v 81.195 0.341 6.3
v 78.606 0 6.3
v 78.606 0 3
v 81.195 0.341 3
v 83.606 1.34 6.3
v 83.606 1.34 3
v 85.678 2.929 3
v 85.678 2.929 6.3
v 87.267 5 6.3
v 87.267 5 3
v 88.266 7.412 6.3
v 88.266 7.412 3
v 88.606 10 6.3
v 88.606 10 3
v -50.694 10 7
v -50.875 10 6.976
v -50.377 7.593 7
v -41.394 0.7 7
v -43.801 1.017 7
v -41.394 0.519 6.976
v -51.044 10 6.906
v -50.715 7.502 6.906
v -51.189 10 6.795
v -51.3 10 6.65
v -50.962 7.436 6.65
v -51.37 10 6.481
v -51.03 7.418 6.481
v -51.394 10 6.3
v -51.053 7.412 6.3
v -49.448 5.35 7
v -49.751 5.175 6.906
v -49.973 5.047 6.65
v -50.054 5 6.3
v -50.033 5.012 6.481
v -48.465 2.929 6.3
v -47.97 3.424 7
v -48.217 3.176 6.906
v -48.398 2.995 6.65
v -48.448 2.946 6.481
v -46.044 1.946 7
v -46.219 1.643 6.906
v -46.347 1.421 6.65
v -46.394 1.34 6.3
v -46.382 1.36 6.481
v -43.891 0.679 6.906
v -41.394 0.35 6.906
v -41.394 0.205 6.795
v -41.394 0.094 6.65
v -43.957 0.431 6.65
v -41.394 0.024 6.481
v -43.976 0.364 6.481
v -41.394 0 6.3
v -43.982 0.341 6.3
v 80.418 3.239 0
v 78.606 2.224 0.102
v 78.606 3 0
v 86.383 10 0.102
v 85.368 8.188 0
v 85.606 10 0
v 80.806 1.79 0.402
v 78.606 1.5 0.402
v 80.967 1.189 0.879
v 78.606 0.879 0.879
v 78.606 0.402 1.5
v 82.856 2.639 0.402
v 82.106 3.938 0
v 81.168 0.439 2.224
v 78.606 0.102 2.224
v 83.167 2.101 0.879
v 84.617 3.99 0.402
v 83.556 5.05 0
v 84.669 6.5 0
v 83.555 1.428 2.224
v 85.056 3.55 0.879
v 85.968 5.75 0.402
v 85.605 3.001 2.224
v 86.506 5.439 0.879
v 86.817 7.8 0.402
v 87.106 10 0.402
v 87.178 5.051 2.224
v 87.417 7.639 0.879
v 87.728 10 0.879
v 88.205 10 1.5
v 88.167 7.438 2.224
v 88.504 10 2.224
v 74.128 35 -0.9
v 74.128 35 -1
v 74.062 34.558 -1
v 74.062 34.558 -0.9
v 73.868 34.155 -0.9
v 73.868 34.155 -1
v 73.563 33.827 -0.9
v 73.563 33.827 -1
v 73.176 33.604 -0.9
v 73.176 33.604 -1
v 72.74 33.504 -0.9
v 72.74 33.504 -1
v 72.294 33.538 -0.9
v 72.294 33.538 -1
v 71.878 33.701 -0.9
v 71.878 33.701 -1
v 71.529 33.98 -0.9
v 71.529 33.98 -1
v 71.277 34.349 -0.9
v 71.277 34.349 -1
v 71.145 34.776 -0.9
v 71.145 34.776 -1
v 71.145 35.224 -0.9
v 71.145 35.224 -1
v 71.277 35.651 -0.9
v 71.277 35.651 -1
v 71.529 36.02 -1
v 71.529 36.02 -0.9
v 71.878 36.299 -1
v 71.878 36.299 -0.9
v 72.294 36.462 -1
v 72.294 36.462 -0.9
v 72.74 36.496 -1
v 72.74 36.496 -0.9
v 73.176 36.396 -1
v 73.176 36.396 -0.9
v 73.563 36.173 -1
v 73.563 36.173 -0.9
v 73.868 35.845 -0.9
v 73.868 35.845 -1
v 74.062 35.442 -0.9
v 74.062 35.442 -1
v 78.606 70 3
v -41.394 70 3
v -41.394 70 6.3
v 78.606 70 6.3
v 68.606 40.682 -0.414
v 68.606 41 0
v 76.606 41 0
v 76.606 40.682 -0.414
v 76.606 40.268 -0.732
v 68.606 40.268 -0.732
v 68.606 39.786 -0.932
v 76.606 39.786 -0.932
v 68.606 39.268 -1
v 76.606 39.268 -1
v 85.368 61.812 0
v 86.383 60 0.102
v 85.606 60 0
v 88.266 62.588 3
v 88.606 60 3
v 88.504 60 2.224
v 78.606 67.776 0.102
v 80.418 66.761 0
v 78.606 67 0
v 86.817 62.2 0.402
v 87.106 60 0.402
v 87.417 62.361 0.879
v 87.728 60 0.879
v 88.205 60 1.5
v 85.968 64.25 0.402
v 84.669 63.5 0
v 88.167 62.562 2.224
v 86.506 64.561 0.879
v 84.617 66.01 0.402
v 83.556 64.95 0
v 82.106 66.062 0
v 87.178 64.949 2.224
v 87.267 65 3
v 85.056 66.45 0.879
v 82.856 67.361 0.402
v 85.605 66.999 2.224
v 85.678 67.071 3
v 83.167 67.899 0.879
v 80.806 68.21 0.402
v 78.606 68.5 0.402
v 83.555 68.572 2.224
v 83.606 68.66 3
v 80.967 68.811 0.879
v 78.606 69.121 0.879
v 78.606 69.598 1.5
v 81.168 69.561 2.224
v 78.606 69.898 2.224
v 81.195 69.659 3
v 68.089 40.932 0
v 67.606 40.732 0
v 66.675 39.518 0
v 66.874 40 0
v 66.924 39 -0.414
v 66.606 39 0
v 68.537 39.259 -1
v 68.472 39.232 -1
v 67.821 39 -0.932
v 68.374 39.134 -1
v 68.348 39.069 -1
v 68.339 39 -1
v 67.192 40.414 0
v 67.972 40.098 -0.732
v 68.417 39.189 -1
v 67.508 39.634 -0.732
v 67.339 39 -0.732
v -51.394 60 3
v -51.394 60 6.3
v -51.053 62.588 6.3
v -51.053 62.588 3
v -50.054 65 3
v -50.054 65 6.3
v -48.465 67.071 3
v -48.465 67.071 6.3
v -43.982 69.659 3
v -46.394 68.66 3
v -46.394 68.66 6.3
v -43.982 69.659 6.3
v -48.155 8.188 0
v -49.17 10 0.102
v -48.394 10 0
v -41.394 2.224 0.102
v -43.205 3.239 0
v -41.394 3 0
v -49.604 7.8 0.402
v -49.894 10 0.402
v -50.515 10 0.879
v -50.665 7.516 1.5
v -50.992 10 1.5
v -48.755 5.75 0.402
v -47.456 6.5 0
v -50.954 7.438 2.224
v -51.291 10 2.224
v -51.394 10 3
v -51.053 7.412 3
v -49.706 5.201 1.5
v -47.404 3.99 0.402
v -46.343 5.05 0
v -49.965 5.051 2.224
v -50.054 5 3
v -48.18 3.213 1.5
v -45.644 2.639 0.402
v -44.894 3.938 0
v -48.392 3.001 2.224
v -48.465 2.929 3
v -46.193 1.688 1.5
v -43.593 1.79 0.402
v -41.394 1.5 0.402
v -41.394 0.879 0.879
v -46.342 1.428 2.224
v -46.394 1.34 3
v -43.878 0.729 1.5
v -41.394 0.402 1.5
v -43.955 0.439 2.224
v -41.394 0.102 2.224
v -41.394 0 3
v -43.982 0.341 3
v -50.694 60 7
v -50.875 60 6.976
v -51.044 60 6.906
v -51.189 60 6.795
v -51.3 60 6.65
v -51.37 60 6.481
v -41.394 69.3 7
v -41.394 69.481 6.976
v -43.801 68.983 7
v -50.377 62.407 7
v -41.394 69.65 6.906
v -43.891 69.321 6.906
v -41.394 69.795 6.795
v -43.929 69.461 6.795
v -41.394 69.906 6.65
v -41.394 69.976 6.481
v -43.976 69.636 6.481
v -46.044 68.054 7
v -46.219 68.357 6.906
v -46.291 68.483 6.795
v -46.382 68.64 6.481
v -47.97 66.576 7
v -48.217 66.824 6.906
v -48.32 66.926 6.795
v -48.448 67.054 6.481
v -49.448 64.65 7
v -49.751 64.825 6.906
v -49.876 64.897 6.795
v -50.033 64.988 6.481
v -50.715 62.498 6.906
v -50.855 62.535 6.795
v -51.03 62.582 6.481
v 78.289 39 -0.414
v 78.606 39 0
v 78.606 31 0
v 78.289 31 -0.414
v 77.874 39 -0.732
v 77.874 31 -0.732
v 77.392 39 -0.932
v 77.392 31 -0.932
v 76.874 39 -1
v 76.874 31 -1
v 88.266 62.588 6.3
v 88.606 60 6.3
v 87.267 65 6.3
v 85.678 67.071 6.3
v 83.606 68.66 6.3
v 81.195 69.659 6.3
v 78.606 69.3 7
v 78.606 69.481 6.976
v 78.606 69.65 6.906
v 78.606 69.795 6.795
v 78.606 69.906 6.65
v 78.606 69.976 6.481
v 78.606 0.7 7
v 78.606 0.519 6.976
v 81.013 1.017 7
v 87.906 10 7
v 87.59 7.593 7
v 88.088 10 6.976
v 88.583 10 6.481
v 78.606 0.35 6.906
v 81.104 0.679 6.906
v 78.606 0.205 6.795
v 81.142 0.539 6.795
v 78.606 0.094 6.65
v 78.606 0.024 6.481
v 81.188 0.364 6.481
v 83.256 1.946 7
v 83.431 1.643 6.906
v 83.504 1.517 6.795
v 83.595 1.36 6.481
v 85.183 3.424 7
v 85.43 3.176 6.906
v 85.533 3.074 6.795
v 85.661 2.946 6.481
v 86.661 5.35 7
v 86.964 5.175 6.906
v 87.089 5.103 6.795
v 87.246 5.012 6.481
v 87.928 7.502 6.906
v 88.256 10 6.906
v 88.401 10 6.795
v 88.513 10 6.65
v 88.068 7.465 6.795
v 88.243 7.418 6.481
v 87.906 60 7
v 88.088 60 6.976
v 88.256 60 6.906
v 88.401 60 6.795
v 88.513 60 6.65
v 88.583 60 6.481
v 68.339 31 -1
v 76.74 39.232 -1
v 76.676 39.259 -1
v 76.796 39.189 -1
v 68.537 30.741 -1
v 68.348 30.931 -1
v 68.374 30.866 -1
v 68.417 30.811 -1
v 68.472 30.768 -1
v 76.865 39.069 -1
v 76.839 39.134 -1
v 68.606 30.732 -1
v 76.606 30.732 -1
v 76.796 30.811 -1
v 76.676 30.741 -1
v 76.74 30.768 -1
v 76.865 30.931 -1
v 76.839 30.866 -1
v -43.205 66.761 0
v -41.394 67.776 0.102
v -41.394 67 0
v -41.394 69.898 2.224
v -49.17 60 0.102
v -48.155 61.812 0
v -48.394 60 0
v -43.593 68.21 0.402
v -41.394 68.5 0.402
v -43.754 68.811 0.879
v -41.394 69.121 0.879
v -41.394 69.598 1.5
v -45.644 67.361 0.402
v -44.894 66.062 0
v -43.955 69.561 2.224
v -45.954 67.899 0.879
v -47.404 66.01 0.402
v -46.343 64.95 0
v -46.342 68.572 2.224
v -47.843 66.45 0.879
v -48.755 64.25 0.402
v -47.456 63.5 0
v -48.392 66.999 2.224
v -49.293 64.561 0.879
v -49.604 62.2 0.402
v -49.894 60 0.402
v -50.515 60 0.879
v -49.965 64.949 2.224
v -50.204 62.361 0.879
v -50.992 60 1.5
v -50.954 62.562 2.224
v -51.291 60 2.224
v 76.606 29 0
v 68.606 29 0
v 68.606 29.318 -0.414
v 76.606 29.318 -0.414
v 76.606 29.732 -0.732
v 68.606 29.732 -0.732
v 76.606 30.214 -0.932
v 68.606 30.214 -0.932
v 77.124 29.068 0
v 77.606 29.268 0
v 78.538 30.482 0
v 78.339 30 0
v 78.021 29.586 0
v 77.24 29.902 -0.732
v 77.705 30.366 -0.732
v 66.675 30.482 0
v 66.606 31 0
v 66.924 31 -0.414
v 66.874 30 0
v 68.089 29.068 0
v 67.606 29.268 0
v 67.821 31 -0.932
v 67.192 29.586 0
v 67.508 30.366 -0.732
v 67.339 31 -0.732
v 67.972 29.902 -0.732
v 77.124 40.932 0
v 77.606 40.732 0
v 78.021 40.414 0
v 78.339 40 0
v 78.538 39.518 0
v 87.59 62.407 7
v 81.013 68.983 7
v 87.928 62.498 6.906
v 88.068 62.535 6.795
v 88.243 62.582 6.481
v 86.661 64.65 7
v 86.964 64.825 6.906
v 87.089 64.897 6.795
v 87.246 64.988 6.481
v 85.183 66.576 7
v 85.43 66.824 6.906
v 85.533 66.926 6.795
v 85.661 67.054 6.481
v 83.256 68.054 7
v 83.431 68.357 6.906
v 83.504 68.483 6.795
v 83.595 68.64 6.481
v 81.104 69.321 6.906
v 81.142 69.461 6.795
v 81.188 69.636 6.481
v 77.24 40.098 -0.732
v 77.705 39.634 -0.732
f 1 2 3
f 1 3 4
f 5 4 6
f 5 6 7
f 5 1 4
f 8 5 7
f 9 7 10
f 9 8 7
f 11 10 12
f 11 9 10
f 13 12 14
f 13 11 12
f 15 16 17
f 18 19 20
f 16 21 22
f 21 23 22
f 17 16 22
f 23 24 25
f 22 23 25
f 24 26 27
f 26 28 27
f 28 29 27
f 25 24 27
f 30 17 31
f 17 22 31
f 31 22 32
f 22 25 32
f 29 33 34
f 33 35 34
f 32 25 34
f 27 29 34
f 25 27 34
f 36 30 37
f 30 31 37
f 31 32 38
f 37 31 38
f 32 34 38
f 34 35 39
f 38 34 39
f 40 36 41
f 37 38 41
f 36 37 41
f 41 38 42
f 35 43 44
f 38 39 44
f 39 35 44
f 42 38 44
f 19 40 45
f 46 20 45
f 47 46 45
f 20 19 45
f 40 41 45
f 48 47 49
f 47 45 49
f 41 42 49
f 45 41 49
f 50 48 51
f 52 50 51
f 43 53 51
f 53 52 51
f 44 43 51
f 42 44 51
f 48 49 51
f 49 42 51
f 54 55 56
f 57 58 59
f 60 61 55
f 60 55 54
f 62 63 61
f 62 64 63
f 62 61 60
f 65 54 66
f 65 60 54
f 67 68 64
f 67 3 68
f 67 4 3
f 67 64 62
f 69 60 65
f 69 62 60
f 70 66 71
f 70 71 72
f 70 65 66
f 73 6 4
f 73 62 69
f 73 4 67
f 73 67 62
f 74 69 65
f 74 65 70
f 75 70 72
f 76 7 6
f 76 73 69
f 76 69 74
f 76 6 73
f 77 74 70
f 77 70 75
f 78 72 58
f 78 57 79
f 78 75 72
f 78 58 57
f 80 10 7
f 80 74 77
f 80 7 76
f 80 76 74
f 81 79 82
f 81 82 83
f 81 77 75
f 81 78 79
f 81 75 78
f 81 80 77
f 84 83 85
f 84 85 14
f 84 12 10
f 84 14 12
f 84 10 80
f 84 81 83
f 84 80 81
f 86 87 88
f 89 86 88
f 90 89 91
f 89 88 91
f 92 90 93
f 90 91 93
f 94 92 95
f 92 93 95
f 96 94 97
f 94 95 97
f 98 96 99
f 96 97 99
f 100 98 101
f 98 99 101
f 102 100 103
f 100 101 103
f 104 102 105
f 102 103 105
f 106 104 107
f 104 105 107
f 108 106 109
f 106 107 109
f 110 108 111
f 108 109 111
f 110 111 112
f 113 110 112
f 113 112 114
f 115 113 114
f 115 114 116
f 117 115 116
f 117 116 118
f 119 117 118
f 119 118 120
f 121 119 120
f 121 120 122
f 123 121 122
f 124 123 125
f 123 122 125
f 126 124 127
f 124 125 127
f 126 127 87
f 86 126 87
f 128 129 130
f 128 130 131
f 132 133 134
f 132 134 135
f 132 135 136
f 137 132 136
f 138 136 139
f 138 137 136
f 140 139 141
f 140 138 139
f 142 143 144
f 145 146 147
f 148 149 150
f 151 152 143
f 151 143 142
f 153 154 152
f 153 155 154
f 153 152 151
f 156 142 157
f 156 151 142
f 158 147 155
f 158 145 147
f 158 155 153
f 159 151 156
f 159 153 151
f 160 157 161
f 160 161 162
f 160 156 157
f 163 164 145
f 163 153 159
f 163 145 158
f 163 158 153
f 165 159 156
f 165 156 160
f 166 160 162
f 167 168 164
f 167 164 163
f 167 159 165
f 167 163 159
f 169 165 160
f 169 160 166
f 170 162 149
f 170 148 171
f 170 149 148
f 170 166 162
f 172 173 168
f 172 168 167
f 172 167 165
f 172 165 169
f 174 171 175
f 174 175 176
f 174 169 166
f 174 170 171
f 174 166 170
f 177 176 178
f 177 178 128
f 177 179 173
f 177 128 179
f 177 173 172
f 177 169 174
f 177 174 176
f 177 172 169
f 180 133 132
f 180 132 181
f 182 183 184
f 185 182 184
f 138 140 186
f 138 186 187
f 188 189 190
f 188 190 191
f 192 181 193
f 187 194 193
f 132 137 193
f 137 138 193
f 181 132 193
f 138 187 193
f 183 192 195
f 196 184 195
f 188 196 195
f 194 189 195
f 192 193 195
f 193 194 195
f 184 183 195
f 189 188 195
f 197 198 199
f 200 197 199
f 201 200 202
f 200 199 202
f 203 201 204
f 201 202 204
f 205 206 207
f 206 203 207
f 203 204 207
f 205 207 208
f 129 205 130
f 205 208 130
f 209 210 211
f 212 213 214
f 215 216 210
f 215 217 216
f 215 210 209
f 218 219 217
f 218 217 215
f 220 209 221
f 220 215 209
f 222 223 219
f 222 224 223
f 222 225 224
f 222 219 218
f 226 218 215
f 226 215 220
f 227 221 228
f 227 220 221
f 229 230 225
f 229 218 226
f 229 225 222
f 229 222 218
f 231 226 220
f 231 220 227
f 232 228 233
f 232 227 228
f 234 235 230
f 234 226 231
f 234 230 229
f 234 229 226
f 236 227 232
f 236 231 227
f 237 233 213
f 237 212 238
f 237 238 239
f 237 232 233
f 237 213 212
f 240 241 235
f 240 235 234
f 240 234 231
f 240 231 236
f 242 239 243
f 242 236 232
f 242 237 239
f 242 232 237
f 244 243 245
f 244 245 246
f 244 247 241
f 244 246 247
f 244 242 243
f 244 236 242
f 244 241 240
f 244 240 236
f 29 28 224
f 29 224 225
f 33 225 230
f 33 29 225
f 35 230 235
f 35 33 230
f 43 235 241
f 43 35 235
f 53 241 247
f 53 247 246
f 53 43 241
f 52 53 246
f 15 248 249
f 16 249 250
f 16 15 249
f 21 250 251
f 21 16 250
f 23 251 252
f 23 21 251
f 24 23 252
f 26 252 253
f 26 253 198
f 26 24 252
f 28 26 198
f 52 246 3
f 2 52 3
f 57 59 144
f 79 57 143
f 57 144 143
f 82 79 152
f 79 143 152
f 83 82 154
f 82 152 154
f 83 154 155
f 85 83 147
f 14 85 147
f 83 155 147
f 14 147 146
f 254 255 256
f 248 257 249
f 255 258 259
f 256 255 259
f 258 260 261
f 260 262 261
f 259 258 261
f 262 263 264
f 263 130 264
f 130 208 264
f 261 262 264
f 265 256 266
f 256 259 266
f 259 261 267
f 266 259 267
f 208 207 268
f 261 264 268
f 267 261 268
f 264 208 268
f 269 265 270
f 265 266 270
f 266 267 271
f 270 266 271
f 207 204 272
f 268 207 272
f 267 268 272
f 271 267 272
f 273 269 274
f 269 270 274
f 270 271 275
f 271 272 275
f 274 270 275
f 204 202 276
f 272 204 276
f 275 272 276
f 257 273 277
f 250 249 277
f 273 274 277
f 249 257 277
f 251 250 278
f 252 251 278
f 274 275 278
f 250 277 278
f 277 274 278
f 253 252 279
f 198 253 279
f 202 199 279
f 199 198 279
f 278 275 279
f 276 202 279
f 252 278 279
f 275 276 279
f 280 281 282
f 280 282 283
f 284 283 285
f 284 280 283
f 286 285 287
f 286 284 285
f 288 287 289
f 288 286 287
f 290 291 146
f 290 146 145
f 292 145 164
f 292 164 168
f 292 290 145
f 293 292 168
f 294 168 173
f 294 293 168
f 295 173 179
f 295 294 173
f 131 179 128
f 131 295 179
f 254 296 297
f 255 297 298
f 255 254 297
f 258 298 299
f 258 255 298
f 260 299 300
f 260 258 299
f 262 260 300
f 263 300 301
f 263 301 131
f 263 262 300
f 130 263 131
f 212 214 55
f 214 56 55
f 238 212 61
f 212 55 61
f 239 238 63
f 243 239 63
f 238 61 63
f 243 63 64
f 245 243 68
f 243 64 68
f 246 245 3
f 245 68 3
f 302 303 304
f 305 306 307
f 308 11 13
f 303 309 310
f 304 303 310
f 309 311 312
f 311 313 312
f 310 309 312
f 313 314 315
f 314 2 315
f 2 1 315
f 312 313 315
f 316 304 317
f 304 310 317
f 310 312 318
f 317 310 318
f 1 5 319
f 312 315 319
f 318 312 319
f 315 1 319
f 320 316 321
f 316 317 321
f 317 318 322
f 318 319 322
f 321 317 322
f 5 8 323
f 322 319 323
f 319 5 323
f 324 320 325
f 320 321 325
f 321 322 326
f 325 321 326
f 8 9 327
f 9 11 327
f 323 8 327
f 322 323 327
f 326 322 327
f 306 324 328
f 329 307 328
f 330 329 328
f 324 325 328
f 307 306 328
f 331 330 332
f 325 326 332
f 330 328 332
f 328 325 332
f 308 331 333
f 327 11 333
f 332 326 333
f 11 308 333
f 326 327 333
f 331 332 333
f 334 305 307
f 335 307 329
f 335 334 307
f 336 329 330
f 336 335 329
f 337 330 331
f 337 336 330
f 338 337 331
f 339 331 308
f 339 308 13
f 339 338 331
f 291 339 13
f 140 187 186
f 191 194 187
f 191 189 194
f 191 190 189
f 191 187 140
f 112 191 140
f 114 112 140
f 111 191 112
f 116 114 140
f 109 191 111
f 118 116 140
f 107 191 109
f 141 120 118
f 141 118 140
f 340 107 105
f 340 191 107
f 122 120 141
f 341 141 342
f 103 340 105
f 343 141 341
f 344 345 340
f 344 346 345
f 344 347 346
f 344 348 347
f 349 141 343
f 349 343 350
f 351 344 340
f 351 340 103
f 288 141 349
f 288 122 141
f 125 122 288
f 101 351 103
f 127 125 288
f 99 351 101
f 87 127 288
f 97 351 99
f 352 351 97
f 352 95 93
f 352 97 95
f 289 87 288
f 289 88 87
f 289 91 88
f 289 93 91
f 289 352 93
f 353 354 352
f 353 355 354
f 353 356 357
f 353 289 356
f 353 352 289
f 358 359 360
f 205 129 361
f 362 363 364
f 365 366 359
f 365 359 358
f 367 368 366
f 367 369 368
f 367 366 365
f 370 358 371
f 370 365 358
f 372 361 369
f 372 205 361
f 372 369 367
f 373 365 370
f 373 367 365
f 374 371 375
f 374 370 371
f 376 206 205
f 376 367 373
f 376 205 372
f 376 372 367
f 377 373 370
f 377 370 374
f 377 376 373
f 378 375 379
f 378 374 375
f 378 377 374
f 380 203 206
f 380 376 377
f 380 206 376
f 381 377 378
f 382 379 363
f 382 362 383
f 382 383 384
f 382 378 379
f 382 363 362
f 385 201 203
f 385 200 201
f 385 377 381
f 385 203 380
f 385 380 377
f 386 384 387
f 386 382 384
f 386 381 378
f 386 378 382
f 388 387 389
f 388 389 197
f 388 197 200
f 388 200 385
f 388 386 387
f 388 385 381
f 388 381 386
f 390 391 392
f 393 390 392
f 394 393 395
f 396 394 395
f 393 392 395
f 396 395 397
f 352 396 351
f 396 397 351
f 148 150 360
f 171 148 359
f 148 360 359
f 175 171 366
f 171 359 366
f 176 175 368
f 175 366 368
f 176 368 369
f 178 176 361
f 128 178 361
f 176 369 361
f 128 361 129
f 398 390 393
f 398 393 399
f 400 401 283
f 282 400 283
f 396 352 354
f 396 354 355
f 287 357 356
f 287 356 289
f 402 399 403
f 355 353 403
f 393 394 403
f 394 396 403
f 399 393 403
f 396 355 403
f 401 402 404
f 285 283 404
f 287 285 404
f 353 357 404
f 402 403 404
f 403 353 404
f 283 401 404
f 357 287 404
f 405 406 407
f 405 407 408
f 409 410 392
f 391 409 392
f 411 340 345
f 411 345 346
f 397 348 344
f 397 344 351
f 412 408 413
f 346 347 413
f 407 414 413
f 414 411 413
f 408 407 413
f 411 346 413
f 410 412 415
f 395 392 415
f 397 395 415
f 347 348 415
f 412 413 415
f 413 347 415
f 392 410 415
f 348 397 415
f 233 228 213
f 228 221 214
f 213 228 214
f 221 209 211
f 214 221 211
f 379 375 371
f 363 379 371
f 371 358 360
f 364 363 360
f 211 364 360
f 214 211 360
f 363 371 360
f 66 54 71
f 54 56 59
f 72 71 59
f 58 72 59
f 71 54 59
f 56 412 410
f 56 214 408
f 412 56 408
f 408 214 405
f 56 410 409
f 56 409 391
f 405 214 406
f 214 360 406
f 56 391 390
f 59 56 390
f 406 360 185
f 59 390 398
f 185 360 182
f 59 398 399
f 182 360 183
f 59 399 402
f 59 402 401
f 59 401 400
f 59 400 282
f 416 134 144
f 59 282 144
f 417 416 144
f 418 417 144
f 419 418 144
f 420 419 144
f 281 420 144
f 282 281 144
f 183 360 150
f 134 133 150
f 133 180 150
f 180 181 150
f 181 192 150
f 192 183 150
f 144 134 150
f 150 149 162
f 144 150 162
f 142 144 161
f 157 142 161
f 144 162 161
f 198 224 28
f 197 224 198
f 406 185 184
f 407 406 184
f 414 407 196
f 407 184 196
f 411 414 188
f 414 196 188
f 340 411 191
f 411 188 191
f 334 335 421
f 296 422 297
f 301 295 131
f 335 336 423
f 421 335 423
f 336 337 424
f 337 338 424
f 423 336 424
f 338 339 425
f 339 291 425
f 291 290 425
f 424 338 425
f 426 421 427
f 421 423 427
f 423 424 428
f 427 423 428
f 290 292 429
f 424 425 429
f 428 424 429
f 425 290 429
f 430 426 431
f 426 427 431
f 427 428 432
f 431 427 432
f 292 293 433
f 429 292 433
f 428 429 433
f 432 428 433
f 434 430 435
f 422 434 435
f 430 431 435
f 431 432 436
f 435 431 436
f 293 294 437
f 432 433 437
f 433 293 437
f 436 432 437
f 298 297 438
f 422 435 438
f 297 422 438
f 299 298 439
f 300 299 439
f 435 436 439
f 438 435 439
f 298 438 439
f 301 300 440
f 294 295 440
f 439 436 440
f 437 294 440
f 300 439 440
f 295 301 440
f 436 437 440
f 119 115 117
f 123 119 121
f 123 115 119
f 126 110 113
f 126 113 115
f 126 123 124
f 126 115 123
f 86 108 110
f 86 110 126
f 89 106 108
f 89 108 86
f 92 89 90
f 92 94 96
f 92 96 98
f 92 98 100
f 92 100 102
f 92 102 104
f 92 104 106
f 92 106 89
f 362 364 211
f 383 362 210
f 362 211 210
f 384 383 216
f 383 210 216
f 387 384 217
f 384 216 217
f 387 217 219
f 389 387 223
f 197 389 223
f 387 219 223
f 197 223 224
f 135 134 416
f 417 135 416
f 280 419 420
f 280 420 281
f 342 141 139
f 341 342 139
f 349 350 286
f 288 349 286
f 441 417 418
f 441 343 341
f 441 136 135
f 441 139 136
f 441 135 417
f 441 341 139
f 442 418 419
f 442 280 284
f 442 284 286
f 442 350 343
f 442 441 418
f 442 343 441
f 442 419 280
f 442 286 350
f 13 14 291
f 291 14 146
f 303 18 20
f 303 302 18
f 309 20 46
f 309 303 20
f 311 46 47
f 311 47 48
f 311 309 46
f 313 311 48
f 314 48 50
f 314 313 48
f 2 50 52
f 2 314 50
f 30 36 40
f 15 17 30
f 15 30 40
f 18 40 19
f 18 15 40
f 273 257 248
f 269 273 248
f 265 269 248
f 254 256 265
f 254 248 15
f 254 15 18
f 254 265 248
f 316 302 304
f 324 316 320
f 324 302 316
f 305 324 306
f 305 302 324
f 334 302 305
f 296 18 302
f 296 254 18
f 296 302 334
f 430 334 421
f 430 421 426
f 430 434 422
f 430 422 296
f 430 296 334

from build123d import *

# Parameters (mm, degrees)
F0_W         = 140
F0_H         = 70
F1_DEPTH     = 7
F2_R         = 10
F3_R         = 0.7
F4_R         = 3
F6_DEPTH     = 1
F7_R         = 2
F8_T1_DEPTH  = 8
F8_T3_DEPTH  = 8
F8_T6_ANGLE  = 90
F8_T8_ANGLE  = 90
F8_T10_ANGLE = 90
F8_T12_ANGLE = 90
F9_DEPTH     = 0.5
F10_R        = 1.5
F11_DEPTH    = 0.1


# Not quite as in the source:
# - a fillet or chamfer that OpenCascade refuses, or shapes differently, is made with other operations: its cross-section is extruded or revolved along the edge and cut away or added


with BuildPart() as f1:
    # F0 (on Top) → F1 (new body)
    with BuildSketch(Plane.XY):
        with Locations((18.6064650118, 35)):
            Rectangle(F0_W, F0_H)
    extrude(amount=F1_DEPTH)

    # F2
    f2_edges = [f1.edges().sort_by_distance(p)[0] for p in [
        (88.606465, 70, 3.5),
        (88.606465, 0, 3.5),
        (-51.393535, 0, 3.5),
        (-51.393535, 70, 3.5),
    ]]
    fillet(f2_edges, radius=F2_R)

    # F3
    f3_edges = [f1.edges().sort_by_distance(p)[0] for p in [
        (18.606465, 0, 7),
        (88.606465, 35, 7),
        (85.677533, 2.928932, 7),
        (85.677533, 67.071068, 7),
        (18.606465, 70, 7),
        (-48.464603, 2.928932, 7),
        (-48.464603, 67.071068, 7),
        (-51.393535, 35, 7),
    ]]
    fillet(f3_edges, radius=F3_R)

    # F4
    f4_edges = [f1.edges().sort_by_distance(p)[0] for p in [
        (18.606465, 0, 0),
        (88.606465, 35, 0),
        (85.677533, 2.928932, 0),
        (85.677533, 67.071068, 0),
        (18.606465, 70, 0),
        (-48.464603, 2.928932, 0),
        (-48.464603, 67.071068, 0),
        (-51.393535, 35, 0),
    ]]
    fillet(f4_edges, radius=F4_R)

    # F5 (on face) → F6 (join)
    with BuildSketch(Plane(origin=(0, 0, 0), x_dir=(1, 0, 0), z_dir=(0, 0, -1))):
        Polygon((78.6064650118, -41), (78.6064650118, -35), (78.6064650118, -29), (66.6064650118, -29), (66.6064650118, -41), align=None)
    extrude(amount=F6_DEPTH)

    # F7
    f7_edges = [f1.edges().sort_by_distance(p)[0] for p in [
        (66.606465, 41, -0.5),
        (66.606465, 29, -0.5),
        (78.606465, 29, -0.5),
        (78.606465, 41, -0.5),
    ]]
    fillet(f7_edges, radius=F7_R)

    # F8: fillet of radius 2 on 1 edges, made by hand

    # F8_s2 → F8_t1 (cut)
    with BuildSketch(Plane.YZ.offset(68.6064650118)):
        with BuildLine():
            ThreePointArc((41, 0), (40.2679491924, -0.7320508076), (39.2679491924, -1))
            Line((39.2679491924, -1), (41, -1))
            Line((41, -1), (41, 0))
        make_face()
        with BuildLine():
            ThreePointArc((29, 0), (29.7320508076, -0.7320508076), (30.7320508076, -1))
            Line((30.7320508076, -1), (29, -1))
            Line((29, -1), (29, 0))
        make_face()
    extrude(amount=F8_T1_DEPTH, mode=Mode.SUBTRACT)

    # F8_s4 → F8_t3 (cut)
    with BuildSketch(Plane.XZ.offset(-39)):
        with BuildLine():
            ThreePointArc((78.6064650118, 0), (77.8744142043, -0.7320508076), (76.8744142043, -1))
            Line((76.8744142043, -1), (78.6064650118, -1))
            Line((78.6064650118, -1), (78.6064650118, 0))
        make_face()
        with BuildLine():
            ThreePointArc((66.6064650118, 0), (67.3385158194, -0.7320508076), (68.3385158194, -1))
            Line((68.3385158194, -1), (66.6064650118, -1))
            Line((66.6064650118, -1), (66.6064650118, 0))
        make_face()
    extrude(amount=F8_T3_DEPTH, mode=Mode.SUBTRACT)

    # F8_s5 → F8_t6 (revolve, cut)
    with BuildSketch(Plane.YZ.offset(68.6064650118)):
        with BuildLine():
            ThreePointArc((41, 0), (40.2679491924, -0.7320508076), (39.2679491924, -1))
            Line((39.2679491924, -1), (41, -1))
            Line((41, -1), (41, 0))
        make_face()
    revolve(axis=Axis((68.6064650118, 39, -1), (0, 0, 1)), revolution_arc=F8_T6_ANGLE, mode=Mode.SUBTRACT)

    # F8_s7 → F8_t8 (revolve, cut)
    with BuildSketch(Plane.YZ.offset(76.6064650118)):
        with BuildLine():
            ThreePointArc((41, 0), (40.2679491924, -0.7320508076), (39.2679491924, -1))
            Line((39.2679491924, -1), (41, -1))
            Line((41, -1), (41, 0))
        make_face()
    revolve(axis=Axis((76.6064650118, 39, -1), (0, 0, -1)), revolution_arc=F8_T8_ANGLE, mode=Mode.SUBTRACT)

    # F8_s9 → F8_t10 (revolve, cut)
    with BuildSketch(Plane.YZ.offset(76.6064650118)):
        with BuildLine():
            ThreePointArc((29, 0), (29.7320508076, -0.7320508076), (30.7320508076, -1))
            Line((30.7320508076, -1), (29, -1))
            Line((29, -1), (29, 0))
        make_face()
    revolve(axis=Axis((76.6064650118, 31, -1), (0, 0, 1)), revolution_arc=F8_T10_ANGLE, mode=Mode.SUBTRACT)

    # F8_s11 → F8_t12 (revolve, cut)
    with BuildSketch(Plane.XZ.offset(-31)):
        with BuildLine():
            ThreePointArc((66.6064650118, 0), (67.3385158194, -0.7320508076), (68.3385158194, -1))
            Line((68.3385158194, -1), (66.6064650118, -1))
            Line((66.6064650118, -1), (66.6064650118, 0))
        make_face()
    revolve(axis=Axis((68.6064650118, 31, -1), (0, 0, 1)), revolution_arc=F8_T12_ANGLE, mode=Mode.SUBTRACT)

    # F9 (cut): faces of the model
    f9_faces = [f1.faces().sort_by_distance(p)[0] for p in [
        (72.6064650118, 35, -1),
        (17.7021104435, 35, 0),
    ]]
    extrude(f9_faces, amount=F9_DEPTH, mode=Mode.SUBTRACT)

    # F10 (on face) → F11 (cut)
    with BuildSketch(Plane(origin=(0, 0, -1), x_dir=(1, 0, 0), z_dir=(0, 0, -1))):
        with Locations((72.6282298565, -35)):
            Circle(F10_R)
    extrude(amount=-F11_DEPTH, mode=Mode.SUBTRACT)


solid = f1.part
